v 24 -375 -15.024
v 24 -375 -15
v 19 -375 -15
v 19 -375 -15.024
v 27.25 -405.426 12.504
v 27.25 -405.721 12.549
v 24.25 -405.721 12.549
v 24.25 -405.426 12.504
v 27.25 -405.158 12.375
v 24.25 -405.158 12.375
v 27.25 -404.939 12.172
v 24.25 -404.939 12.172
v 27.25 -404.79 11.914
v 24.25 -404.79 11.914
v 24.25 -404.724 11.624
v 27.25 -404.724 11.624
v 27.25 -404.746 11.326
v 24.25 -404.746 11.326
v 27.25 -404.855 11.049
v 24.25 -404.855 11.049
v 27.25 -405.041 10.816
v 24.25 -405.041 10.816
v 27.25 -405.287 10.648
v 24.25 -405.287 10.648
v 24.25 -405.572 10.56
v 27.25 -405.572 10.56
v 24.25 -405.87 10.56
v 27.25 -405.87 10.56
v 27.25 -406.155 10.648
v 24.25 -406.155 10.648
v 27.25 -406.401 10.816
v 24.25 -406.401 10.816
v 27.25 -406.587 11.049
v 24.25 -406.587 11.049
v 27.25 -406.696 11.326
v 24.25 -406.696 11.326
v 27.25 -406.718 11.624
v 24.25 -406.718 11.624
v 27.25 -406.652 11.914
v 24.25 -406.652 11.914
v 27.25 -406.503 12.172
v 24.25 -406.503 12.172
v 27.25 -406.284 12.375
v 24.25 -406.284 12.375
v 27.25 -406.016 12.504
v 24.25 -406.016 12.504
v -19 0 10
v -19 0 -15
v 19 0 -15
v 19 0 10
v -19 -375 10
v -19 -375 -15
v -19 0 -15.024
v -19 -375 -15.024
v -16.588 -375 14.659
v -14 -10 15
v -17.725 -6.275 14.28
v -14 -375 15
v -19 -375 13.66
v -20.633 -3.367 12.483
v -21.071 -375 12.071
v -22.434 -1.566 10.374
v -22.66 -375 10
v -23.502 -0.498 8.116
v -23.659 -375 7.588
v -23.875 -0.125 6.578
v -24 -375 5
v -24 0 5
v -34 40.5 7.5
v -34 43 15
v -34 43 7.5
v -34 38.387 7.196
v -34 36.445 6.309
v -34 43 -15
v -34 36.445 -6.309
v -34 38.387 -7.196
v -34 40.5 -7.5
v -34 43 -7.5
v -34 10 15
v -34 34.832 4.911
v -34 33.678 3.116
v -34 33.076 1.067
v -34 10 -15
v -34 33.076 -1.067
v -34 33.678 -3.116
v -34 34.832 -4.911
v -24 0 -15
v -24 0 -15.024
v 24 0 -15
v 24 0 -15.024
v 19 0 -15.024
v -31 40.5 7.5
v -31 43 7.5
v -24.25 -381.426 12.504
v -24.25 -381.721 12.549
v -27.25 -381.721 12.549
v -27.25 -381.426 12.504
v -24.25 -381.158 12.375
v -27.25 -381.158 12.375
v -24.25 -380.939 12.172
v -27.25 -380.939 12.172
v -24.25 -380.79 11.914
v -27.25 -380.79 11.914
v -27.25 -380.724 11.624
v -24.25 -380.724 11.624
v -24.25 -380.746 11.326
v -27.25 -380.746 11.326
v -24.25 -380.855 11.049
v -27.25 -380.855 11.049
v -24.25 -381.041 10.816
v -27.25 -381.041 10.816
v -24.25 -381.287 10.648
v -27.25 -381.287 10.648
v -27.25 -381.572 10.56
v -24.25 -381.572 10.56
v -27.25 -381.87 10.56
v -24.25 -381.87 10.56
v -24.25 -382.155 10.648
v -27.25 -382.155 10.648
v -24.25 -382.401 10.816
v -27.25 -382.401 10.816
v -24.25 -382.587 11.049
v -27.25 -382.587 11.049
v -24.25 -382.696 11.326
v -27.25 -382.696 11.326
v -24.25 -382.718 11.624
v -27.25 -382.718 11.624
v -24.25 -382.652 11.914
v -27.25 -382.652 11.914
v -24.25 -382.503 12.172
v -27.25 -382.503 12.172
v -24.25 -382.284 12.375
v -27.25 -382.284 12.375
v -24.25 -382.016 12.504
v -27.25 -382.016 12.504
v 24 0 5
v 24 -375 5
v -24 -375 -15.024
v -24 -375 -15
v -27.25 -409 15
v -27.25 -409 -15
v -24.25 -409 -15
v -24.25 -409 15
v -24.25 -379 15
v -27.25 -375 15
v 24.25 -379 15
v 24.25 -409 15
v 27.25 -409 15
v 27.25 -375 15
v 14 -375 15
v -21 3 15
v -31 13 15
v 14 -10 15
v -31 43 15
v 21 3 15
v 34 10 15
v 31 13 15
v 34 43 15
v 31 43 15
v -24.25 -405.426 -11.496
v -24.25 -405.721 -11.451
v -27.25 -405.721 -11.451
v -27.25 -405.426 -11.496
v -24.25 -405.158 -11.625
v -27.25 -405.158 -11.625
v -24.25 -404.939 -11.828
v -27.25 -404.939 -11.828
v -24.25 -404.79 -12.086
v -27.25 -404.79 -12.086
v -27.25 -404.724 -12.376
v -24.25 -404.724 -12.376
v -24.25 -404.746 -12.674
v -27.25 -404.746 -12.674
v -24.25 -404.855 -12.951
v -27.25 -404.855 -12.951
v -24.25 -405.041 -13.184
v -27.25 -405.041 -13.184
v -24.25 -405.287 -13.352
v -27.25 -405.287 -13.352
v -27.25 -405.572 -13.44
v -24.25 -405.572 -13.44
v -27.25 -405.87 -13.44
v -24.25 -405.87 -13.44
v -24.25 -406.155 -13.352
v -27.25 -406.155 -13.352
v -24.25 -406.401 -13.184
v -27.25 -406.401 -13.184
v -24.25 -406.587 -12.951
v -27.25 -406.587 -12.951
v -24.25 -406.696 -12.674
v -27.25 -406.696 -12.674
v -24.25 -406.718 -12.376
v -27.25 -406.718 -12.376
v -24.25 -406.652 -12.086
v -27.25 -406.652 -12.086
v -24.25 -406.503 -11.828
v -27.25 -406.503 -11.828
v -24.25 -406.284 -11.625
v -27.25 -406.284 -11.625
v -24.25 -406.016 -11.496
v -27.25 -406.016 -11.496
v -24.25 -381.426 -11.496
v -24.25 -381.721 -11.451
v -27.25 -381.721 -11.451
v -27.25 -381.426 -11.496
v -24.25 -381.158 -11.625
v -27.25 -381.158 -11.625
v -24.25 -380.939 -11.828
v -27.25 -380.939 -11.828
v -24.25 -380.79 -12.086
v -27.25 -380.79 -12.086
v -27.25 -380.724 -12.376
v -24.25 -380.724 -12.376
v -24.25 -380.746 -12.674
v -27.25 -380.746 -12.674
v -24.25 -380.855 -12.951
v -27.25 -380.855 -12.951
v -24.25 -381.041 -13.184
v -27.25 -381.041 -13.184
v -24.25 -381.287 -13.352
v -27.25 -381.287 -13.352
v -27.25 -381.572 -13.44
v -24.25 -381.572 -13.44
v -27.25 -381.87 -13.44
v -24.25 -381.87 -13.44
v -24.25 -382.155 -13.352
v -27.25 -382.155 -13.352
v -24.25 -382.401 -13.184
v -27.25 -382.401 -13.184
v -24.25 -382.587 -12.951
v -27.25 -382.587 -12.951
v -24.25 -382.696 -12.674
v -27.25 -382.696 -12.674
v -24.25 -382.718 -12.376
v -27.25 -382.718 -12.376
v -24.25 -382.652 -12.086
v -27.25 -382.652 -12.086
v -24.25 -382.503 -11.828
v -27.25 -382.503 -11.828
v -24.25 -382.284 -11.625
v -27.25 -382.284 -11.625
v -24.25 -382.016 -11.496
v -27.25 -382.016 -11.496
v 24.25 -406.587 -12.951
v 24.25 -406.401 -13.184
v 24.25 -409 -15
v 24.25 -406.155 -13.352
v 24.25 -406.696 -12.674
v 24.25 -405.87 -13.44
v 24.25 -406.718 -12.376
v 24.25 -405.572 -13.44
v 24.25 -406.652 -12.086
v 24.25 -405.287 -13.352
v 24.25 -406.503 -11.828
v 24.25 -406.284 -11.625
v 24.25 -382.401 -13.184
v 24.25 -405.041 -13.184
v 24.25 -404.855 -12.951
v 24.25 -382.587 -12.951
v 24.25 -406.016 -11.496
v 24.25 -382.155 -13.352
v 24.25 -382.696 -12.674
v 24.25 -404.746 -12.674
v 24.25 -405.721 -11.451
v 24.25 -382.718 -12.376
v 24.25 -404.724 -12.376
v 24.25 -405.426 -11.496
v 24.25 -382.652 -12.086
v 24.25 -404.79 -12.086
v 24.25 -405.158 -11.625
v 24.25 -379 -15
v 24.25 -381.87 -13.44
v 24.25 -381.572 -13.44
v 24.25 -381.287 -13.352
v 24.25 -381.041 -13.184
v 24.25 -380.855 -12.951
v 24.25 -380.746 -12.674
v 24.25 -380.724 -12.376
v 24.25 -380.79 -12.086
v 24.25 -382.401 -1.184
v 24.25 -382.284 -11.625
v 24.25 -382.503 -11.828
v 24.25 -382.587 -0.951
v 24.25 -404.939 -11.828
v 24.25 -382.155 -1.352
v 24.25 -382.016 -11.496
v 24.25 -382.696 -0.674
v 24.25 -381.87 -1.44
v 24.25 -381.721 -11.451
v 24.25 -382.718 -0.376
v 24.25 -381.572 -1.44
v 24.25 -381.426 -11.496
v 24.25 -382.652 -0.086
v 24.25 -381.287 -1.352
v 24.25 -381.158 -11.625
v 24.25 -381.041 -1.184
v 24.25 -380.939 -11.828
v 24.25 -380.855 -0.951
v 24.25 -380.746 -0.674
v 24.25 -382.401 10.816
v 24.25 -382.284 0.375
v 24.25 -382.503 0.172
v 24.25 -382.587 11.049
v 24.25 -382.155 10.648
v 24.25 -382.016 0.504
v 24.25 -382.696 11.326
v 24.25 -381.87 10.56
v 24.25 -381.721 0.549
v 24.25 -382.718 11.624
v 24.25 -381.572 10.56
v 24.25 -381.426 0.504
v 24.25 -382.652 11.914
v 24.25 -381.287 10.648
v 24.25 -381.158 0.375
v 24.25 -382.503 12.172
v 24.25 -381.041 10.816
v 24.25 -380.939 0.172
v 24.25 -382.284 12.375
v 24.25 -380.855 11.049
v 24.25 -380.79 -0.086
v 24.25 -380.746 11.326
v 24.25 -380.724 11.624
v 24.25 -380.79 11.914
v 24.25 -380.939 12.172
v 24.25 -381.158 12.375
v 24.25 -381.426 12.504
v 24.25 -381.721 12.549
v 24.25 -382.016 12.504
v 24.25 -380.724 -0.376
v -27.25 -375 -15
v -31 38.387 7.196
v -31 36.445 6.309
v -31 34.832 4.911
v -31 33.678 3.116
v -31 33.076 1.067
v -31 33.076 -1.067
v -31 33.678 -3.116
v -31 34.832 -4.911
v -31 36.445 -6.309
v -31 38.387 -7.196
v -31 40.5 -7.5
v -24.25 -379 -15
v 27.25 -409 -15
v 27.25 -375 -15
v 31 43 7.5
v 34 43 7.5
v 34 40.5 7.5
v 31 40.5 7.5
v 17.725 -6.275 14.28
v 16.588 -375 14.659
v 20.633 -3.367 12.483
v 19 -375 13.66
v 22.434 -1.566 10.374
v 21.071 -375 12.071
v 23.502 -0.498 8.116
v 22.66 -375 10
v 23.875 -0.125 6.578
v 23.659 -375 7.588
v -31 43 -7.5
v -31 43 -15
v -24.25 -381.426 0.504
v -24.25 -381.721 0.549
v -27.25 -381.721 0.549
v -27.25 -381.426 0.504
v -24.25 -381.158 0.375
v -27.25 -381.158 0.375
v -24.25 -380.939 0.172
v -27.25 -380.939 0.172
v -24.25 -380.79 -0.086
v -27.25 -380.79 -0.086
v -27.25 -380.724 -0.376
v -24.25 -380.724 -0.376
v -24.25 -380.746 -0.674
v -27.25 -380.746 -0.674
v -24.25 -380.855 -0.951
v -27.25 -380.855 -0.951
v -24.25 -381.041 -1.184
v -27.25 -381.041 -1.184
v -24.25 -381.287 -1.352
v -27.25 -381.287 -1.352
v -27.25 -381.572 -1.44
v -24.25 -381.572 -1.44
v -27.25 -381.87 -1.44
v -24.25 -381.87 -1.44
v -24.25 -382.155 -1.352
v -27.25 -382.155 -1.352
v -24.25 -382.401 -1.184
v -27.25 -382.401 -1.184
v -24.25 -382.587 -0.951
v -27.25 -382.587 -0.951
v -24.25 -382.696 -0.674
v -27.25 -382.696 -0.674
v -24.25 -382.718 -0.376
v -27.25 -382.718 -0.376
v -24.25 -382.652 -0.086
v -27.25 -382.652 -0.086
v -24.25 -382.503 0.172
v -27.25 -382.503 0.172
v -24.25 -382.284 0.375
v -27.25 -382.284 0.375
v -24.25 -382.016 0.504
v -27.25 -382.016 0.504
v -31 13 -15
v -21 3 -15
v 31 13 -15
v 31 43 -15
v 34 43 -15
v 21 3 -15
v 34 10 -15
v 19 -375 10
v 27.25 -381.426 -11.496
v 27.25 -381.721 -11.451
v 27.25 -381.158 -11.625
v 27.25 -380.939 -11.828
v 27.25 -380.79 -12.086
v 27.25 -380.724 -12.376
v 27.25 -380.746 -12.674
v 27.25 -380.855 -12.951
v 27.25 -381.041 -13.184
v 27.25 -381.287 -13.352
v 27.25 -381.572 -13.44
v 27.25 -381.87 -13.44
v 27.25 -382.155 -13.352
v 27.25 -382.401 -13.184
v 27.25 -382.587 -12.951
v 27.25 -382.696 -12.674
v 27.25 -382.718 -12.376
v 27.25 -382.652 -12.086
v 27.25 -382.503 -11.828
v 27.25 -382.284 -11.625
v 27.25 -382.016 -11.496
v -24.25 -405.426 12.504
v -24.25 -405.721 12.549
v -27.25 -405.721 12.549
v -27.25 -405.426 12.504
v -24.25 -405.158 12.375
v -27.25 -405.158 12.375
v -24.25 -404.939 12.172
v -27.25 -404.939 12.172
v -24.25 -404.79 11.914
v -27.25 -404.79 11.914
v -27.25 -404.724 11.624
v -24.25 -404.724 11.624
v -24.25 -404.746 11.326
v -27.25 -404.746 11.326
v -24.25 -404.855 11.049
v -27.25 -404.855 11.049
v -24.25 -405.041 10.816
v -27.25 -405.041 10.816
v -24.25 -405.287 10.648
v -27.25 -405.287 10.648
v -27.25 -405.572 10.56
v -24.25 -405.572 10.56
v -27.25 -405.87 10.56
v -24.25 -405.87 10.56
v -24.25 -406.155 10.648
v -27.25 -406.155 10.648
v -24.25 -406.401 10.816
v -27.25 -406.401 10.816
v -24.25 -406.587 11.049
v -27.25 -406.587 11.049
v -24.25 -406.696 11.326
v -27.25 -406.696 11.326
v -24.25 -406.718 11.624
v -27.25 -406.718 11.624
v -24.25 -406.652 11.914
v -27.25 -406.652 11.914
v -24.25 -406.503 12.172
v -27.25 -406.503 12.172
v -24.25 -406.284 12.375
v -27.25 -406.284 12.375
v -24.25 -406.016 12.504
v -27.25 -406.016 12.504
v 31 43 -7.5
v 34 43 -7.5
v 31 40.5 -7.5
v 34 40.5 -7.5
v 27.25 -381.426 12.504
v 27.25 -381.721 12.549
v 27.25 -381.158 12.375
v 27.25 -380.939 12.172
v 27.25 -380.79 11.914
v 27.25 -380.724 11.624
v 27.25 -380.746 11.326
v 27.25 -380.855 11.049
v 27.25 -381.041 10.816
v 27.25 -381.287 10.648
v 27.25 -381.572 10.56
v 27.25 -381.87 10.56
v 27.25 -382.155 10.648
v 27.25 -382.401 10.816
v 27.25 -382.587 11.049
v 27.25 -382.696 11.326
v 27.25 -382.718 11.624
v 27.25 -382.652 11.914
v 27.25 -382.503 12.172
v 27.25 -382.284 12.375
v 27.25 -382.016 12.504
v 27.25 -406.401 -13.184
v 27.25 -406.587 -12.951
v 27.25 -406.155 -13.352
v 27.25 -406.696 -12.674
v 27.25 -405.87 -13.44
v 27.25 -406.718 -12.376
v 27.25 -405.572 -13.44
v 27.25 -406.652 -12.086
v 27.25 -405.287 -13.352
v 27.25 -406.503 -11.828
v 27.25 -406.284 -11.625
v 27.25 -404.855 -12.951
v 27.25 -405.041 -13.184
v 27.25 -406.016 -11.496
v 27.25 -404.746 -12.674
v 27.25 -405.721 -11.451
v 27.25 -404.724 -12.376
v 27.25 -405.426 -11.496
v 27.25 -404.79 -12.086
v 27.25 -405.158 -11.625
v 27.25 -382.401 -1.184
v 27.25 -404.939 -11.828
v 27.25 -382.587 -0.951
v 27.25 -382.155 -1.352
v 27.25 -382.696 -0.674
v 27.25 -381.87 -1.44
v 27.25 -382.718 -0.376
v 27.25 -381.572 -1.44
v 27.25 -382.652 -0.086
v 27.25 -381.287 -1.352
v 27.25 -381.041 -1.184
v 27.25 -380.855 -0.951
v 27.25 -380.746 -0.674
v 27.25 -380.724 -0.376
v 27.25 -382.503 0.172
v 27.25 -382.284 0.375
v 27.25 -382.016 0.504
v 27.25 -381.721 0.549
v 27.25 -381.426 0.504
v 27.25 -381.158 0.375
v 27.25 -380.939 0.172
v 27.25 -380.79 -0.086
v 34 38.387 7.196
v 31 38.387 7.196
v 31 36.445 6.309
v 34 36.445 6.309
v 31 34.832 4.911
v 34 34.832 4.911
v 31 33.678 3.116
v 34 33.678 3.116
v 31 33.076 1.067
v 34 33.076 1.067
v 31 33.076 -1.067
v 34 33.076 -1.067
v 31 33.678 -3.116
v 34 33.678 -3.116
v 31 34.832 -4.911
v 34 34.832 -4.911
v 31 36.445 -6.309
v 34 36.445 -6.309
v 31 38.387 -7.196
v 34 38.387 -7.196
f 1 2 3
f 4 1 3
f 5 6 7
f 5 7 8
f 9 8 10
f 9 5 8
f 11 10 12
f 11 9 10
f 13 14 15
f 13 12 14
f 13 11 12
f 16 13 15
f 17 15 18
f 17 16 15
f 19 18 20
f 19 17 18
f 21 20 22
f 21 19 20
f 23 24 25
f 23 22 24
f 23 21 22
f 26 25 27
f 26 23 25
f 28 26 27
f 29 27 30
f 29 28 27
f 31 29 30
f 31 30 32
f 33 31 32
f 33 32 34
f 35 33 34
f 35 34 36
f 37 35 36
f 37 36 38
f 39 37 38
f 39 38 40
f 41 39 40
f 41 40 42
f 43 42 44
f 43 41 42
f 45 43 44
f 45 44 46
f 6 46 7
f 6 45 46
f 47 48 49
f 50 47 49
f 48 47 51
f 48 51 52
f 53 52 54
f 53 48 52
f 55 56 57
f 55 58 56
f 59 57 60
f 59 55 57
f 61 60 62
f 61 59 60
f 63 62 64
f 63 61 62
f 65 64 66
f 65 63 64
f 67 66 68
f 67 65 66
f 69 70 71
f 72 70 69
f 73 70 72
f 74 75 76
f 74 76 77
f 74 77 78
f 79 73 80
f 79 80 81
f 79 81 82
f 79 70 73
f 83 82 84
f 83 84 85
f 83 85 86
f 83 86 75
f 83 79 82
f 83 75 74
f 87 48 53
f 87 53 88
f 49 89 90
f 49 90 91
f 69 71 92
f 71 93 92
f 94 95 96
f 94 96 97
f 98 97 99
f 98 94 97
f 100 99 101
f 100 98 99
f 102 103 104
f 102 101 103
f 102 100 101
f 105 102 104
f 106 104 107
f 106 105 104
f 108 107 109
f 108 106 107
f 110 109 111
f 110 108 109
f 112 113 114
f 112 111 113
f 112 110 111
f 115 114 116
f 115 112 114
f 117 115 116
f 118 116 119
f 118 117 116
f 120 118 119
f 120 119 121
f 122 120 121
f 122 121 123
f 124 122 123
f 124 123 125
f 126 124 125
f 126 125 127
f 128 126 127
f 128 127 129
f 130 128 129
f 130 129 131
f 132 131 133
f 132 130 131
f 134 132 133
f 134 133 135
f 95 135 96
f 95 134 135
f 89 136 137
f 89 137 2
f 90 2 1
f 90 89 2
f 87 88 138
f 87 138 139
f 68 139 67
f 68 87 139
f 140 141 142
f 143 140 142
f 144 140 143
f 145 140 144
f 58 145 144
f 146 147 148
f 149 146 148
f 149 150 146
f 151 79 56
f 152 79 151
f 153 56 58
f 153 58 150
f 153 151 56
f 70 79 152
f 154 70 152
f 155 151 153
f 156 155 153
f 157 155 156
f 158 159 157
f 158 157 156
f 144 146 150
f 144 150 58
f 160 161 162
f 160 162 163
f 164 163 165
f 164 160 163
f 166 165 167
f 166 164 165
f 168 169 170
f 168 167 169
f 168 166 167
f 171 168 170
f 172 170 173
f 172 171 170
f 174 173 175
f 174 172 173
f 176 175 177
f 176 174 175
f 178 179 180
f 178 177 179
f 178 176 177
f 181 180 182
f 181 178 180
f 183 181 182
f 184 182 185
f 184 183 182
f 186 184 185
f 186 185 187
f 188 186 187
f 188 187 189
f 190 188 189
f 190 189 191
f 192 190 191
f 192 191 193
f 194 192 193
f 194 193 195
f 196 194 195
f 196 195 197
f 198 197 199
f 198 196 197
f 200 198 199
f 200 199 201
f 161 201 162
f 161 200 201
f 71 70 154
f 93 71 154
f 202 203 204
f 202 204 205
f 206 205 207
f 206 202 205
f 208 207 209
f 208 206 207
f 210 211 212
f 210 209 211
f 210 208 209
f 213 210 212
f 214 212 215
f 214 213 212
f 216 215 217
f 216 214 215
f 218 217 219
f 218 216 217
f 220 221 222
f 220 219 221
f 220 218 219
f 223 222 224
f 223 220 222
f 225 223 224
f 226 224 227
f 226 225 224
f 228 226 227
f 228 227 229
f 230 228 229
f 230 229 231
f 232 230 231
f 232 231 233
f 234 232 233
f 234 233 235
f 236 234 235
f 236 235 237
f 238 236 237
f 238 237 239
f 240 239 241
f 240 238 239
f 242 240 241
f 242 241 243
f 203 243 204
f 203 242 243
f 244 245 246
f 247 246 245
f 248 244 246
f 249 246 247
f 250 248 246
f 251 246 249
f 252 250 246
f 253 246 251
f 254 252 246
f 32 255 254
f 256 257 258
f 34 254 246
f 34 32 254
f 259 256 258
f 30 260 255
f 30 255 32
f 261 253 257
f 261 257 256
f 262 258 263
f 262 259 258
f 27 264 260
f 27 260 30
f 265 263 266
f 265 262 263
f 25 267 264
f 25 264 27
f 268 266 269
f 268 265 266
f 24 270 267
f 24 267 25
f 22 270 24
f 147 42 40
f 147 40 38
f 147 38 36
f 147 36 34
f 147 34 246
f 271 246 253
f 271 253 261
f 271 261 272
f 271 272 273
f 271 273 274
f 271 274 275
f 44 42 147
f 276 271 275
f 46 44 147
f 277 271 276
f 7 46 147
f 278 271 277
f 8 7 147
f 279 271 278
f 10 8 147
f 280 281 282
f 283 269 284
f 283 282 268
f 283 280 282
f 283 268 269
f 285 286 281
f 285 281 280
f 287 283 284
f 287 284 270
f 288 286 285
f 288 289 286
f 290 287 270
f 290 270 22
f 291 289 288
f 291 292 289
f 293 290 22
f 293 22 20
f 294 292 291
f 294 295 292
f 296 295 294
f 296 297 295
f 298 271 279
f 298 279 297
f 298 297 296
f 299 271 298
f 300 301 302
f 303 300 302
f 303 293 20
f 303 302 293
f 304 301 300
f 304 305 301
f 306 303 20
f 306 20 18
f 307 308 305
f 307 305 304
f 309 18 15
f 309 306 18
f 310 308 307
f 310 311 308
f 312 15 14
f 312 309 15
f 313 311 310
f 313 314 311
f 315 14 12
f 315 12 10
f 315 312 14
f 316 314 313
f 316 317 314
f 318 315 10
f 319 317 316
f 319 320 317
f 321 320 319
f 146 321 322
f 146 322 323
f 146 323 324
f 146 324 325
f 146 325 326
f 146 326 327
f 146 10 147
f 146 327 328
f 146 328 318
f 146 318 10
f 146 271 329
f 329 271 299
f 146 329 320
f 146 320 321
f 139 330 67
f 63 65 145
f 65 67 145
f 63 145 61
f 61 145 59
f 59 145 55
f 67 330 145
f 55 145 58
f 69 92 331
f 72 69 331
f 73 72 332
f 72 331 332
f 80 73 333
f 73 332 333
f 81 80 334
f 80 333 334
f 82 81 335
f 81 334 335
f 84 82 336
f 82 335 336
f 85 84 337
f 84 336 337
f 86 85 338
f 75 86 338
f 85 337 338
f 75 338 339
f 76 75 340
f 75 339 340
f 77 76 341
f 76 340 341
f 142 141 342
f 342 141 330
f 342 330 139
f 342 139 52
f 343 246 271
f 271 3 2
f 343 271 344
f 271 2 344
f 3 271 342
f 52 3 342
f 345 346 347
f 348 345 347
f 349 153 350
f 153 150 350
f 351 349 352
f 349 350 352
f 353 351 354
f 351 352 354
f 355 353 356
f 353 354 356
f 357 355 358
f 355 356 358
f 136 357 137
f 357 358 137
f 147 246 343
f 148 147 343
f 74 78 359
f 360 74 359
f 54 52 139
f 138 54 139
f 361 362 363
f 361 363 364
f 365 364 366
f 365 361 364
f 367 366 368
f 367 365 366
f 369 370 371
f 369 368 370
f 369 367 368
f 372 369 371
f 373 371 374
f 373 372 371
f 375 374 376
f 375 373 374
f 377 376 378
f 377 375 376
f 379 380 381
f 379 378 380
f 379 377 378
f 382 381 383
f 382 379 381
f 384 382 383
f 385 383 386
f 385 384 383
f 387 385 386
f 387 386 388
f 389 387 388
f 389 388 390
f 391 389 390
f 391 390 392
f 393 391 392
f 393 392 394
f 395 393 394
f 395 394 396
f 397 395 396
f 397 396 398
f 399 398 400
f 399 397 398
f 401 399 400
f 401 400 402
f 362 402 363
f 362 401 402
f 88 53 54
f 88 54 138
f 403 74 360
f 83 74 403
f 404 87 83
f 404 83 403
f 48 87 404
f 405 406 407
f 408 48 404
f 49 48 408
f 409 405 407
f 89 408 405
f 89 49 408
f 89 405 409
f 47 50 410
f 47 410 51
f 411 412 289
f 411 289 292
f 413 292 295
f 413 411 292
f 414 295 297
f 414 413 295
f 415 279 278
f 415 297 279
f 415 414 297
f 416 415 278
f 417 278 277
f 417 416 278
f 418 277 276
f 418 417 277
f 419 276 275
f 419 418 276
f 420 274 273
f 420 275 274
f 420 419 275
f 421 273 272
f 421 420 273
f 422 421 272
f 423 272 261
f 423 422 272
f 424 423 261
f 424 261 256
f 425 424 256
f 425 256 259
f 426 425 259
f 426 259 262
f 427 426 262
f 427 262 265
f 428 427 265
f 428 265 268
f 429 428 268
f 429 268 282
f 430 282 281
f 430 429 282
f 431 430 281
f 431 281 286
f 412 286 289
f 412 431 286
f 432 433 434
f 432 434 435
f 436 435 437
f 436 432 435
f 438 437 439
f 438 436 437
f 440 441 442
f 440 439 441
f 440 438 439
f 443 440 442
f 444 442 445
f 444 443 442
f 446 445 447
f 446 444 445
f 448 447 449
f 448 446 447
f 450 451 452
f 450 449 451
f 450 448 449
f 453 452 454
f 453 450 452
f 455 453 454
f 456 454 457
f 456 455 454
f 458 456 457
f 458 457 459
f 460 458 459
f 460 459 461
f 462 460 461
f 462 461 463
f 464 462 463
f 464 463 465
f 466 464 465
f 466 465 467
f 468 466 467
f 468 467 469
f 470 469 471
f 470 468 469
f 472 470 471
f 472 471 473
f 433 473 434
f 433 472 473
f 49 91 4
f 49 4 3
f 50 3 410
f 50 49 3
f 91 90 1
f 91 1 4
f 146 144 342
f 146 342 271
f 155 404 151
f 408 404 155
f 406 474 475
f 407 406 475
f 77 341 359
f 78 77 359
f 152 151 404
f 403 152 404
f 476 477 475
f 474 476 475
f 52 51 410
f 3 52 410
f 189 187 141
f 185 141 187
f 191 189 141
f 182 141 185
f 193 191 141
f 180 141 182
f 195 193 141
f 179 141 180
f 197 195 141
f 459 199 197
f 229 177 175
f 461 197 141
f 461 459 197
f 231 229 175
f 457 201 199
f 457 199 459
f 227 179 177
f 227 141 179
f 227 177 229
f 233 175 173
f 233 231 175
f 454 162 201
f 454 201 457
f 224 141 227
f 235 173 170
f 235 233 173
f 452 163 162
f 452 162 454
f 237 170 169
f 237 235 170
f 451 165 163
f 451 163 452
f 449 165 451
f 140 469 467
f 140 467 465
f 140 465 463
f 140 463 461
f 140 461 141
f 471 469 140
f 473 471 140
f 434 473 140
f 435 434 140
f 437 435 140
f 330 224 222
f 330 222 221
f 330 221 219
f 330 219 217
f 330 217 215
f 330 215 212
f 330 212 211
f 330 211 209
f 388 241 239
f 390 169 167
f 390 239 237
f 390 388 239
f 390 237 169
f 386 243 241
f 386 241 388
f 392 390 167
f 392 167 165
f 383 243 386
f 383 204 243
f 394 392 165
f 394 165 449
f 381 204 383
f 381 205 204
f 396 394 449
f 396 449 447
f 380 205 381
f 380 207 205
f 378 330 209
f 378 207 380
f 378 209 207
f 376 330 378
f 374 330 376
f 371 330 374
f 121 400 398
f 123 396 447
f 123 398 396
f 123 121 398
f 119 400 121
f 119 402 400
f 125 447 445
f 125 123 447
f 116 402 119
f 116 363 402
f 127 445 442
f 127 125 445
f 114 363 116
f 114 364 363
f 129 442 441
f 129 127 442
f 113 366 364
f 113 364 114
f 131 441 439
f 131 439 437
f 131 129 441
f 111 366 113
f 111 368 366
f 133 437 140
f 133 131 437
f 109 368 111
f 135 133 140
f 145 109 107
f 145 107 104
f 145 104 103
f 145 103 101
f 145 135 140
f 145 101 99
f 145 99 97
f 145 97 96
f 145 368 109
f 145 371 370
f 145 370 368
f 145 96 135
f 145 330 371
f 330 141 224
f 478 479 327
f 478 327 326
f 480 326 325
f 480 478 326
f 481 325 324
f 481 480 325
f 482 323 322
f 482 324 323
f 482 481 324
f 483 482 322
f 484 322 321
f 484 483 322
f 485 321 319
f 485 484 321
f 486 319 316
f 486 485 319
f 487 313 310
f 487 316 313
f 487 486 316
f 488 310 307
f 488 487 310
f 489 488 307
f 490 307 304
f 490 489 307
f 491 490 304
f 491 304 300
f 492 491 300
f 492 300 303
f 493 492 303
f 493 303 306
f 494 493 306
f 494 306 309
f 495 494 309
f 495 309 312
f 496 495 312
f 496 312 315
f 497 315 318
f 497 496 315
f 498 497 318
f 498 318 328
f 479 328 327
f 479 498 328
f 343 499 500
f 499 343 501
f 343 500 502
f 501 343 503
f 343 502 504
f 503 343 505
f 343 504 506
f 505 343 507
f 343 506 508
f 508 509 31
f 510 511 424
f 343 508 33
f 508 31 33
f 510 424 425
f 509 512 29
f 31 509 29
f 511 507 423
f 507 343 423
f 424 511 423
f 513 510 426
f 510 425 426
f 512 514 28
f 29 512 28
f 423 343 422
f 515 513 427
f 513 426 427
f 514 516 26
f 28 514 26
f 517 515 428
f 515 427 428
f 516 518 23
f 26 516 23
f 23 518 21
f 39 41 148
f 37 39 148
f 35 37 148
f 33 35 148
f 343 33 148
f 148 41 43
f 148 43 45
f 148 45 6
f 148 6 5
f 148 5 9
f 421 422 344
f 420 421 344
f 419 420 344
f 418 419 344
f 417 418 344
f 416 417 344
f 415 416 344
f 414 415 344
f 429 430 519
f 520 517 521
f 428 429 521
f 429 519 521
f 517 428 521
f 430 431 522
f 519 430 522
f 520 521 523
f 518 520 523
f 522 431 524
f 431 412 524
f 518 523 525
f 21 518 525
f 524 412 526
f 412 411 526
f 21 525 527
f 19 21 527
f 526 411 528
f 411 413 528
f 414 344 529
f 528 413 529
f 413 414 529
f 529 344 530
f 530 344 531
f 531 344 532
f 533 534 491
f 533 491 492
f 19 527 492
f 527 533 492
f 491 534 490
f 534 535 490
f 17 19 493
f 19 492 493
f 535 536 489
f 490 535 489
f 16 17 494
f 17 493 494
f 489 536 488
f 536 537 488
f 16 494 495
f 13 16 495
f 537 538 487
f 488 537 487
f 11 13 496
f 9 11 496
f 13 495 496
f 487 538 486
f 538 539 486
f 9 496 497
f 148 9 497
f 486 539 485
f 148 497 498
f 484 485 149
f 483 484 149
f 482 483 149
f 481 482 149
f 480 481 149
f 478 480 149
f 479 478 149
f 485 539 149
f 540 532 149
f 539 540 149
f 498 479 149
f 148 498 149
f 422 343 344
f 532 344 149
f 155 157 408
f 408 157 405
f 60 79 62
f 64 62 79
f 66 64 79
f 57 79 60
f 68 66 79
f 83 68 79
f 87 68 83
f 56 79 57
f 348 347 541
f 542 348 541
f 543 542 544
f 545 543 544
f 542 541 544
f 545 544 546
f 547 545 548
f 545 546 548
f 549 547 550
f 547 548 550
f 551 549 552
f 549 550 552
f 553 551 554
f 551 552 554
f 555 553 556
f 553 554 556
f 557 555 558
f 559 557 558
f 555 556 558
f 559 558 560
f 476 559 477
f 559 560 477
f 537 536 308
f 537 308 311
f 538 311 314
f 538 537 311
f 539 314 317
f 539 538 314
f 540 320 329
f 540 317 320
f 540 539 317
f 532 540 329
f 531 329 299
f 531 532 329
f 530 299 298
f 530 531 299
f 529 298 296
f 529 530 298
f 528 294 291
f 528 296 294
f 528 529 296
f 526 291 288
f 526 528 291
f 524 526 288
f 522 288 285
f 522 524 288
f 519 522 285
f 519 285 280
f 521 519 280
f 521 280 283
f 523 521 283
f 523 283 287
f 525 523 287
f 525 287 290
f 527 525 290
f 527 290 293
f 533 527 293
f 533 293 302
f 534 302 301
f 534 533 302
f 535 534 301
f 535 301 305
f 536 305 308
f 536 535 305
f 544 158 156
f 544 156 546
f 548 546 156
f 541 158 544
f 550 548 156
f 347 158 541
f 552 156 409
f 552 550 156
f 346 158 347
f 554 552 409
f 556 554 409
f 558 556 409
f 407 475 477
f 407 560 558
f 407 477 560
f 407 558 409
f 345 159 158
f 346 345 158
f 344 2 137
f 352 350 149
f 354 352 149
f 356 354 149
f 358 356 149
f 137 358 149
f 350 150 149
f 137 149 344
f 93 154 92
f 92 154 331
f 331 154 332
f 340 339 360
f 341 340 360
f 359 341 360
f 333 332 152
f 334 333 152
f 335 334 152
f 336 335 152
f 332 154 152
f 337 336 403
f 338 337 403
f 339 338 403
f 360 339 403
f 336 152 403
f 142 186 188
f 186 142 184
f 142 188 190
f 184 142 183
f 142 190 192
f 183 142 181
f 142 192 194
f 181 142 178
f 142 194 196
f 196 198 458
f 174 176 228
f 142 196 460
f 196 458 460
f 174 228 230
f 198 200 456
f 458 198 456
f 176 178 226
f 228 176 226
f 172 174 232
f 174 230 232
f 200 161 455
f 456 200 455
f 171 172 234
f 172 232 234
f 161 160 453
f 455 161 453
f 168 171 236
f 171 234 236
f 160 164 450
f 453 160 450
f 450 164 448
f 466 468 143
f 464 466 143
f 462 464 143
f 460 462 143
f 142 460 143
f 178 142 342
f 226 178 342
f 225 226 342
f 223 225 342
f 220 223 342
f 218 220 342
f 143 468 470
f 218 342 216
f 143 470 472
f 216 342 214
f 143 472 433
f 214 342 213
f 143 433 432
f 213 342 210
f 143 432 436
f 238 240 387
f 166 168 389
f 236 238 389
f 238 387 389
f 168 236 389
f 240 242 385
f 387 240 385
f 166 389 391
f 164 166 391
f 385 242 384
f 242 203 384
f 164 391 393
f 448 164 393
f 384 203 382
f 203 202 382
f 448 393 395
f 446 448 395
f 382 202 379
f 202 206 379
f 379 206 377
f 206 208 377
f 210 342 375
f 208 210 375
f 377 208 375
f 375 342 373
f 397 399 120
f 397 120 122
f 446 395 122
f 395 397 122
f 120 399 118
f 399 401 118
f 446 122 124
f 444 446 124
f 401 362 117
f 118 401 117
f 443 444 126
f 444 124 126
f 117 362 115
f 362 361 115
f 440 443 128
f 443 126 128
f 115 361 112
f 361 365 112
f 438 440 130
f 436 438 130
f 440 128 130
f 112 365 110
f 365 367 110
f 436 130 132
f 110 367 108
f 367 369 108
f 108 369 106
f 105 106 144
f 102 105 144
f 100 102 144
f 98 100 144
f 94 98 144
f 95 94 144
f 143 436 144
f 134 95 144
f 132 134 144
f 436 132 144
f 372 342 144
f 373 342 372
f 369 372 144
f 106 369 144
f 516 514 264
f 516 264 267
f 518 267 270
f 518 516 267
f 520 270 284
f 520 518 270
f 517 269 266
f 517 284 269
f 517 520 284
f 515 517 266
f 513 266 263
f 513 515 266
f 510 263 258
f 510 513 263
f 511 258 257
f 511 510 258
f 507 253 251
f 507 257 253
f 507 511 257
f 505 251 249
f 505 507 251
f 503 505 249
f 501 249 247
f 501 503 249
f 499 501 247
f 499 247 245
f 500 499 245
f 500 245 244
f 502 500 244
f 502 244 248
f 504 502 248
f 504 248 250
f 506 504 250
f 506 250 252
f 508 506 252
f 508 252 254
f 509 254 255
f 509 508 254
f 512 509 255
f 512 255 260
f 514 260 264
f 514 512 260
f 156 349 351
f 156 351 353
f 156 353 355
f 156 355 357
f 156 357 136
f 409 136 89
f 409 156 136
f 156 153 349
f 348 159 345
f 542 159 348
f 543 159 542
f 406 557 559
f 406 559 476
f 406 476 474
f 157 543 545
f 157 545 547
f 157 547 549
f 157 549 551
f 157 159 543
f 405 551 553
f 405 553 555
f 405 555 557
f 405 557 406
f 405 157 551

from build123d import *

# Parameters (mm, degrees)
SKETCH2_W               = 32
SKETCH2_H               = 30
SKETCH2_W_2             = 15
BOSS_EXTRUDE1_DEPTH     = 3
SKETCH4_W               = 3
SKETCH4_H               = 30
BOSS_EXTRUDE2_DEPTH     = 3
SKETCH5_W               = 3
SKETCH5_H               = 30
BOSS_EXTRUDE3_DEPTH     = 40
CUT_EXTRUDE1_DEPTH      = 82.841309862
CUT_EXTRUDE1_DEPTH_BACK = 82.841309862
CHAMFER1_SIZE           = 10
BOSS_EXTRUDE4_DEPTH     = 375
FILLET2_R               = 10
SKETCH8_W               = 54.5
SKETCH8_H               = 30
BOSS_EXTRUDE5_DEPTH     = 4
SKETCH9_W               = 3
SKETCH9_H               = 30
BOSS_EXTRUDE6_DEPTH     = 30
CUT_EXTRUDE2_DEPTH      = 414.833625156
CUT_EXTRUDE2_DEPTH_BACK = 414.833625156
SKETCH10_R              = 1


with BuildPart() as part:
    # Sketch2 → Boss-Extrude1 (new body)
    with BuildSketch(Plane(origin=(0, 0, 0), x_dir=(1, 0, 0), z_dir=(0, 1, 0))):
        Rectangle(SKETCH2_W, SKETCH2_H)
        with Locations((-23.5, 0)):
            Rectangle(SKETCH2_W_2, SKETCH2_H)
        with Locations((23.5, 0)):
            Rectangle(SKETCH2_W_2, SKETCH2_H)
    extrude(amount=BOSS_EXTRUDE1_DEPTH)

    # Sketch4 → Boss-Extrude2 (add)
    with BuildSketch(Plane(origin=(0, 3, 0), x_dir=(1, 0, 0), z_dir=(0, 1, 0))):
        with Locations((-32.5, 0)):
            Rectangle(SKETCH4_W, SKETCH4_H)
        with Locations((32.5, 0)):
            Rectangle(SKETCH4_W, SKETCH4_H)
    extrude(amount=-BOSS_EXTRUDE2_DEPTH)

    # Sketch5 → Boss-Extrude3 (add)
    with BuildSketch(Plane(origin=(0, 3, 0), x_dir=(1, 0, 0), z_dir=(0, 1, 0))):
        with Locations((-32.5, 0)):
            Rectangle(SKETCH5_W, SKETCH5_H)
        with Locations((32.5, 0)):
            Rectangle(SKETCH5_W, SKETCH5_H)
    extrude(amount=BOSS_EXTRUDE3_DEPTH)

    # Sketch6 → Cut-Extrude1 (cut, two sides: drawn at the far end of the back side and taken through both)
    with BuildSketch(Plane.ZY.offset(34).offset(-CUT_EXTRUDE1_DEPTH_BACK)):
        with BuildLine():
            Line((-7.5, 45.5), (7.5, 45.5))
            Line((7.5, 45.5), (7.5, 40.5))
            ThreePointArc((7.5, 40.5), (0, 33), (-7.5, 40.5))
            Line((-7.5, 40.5), (-7.5, 45.5))
        make_face()
    extrude(amount=CUT_EXTRUDE1_DEPTH + CUT_EXTRUDE1_DEPTH_BACK, mode=Mode.SUBTRACT)

    # Chamfer1
    chamfer1_edges = [part.edges().sort_by_distance(p)[0] for p in [
        (-34, 0, 0),
        (34, 0, 0),
        (-31, 3, 0),
        (31, 3, 0),
    ]]
    chamfer(chamfer1_edges, length=CHAMFER1_SIZE)

    # Sketch7 → Boss-Extrude4 (add)
    with BuildSketch(Plane.XZ):
        Polygon((-24, 15), (24, 15), (24, -15.023541852), (19, -15.023541852), (19, 10), (-19, 10), (-19, -15.023541852), (-24, -15.023541852), align=None)
    extrude(amount=BOSS_EXTRUDE4_DEPTH)

    # Fillet2
    fillet2_edges = [part.edges().sort_by_distance(p)[0] for p in [
        (24, -187.5, 15),
        (-24, -187.5, 15),
    ]]
    fillet(fillet2_edges, radius=FILLET2_R)

    # Sketch8 → Boss-Extrude5 (add)
    with BuildSketch(Plane.XZ.offset(375)):
        Rectangle(SKETCH8_W, SKETCH8_H)
    extrude(amount=BOSS_EXTRUDE5_DEPTH)

    # Sketch9 → Boss-Extrude6 (add)
    with BuildSketch(Plane.XZ.offset(379)):
        with Locations((-25.75, 0)):
            Rectangle(SKETCH9_W, SKETCH9_H)
        with Locations((25.75, 0)):
            Rectangle(SKETCH9_W, SKETCH9_H)
    extrude(amount=BOSS_EXTRUDE6_DEPTH)

    # Sketch10 → Cut-Extrude2 (cut, two sides: drawn at the far end of the back side and taken through both)
    with BuildSketch(Plane.ZY.offset(27.25).offset(-CUT_EXTRUDE2_DEPTH_BACK)):
        with Locations((-12.451139345, -405.721121856)):
            Circle(SKETCH10_R)
        with Locations((11.548860655, -405.721121856)):
            Circle(SKETCH10_R)
        with Locations((-12.451139345, -381.721121856)):
            Circle(SKETCH10_R)
        with Locations((11.548860655, -381.721121856)):
            Circle(SKETCH10_R)
        with Locations((-0.451139345, -381.721121856)):
            Circle(SKETCH10_R)
    extrude(amount=CUT_EXTRUDE2_DEPTH + CUT_EXTRUDE2_DEPTH_BACK, mode=Mode.SUBTRACT)


solid = part.part
